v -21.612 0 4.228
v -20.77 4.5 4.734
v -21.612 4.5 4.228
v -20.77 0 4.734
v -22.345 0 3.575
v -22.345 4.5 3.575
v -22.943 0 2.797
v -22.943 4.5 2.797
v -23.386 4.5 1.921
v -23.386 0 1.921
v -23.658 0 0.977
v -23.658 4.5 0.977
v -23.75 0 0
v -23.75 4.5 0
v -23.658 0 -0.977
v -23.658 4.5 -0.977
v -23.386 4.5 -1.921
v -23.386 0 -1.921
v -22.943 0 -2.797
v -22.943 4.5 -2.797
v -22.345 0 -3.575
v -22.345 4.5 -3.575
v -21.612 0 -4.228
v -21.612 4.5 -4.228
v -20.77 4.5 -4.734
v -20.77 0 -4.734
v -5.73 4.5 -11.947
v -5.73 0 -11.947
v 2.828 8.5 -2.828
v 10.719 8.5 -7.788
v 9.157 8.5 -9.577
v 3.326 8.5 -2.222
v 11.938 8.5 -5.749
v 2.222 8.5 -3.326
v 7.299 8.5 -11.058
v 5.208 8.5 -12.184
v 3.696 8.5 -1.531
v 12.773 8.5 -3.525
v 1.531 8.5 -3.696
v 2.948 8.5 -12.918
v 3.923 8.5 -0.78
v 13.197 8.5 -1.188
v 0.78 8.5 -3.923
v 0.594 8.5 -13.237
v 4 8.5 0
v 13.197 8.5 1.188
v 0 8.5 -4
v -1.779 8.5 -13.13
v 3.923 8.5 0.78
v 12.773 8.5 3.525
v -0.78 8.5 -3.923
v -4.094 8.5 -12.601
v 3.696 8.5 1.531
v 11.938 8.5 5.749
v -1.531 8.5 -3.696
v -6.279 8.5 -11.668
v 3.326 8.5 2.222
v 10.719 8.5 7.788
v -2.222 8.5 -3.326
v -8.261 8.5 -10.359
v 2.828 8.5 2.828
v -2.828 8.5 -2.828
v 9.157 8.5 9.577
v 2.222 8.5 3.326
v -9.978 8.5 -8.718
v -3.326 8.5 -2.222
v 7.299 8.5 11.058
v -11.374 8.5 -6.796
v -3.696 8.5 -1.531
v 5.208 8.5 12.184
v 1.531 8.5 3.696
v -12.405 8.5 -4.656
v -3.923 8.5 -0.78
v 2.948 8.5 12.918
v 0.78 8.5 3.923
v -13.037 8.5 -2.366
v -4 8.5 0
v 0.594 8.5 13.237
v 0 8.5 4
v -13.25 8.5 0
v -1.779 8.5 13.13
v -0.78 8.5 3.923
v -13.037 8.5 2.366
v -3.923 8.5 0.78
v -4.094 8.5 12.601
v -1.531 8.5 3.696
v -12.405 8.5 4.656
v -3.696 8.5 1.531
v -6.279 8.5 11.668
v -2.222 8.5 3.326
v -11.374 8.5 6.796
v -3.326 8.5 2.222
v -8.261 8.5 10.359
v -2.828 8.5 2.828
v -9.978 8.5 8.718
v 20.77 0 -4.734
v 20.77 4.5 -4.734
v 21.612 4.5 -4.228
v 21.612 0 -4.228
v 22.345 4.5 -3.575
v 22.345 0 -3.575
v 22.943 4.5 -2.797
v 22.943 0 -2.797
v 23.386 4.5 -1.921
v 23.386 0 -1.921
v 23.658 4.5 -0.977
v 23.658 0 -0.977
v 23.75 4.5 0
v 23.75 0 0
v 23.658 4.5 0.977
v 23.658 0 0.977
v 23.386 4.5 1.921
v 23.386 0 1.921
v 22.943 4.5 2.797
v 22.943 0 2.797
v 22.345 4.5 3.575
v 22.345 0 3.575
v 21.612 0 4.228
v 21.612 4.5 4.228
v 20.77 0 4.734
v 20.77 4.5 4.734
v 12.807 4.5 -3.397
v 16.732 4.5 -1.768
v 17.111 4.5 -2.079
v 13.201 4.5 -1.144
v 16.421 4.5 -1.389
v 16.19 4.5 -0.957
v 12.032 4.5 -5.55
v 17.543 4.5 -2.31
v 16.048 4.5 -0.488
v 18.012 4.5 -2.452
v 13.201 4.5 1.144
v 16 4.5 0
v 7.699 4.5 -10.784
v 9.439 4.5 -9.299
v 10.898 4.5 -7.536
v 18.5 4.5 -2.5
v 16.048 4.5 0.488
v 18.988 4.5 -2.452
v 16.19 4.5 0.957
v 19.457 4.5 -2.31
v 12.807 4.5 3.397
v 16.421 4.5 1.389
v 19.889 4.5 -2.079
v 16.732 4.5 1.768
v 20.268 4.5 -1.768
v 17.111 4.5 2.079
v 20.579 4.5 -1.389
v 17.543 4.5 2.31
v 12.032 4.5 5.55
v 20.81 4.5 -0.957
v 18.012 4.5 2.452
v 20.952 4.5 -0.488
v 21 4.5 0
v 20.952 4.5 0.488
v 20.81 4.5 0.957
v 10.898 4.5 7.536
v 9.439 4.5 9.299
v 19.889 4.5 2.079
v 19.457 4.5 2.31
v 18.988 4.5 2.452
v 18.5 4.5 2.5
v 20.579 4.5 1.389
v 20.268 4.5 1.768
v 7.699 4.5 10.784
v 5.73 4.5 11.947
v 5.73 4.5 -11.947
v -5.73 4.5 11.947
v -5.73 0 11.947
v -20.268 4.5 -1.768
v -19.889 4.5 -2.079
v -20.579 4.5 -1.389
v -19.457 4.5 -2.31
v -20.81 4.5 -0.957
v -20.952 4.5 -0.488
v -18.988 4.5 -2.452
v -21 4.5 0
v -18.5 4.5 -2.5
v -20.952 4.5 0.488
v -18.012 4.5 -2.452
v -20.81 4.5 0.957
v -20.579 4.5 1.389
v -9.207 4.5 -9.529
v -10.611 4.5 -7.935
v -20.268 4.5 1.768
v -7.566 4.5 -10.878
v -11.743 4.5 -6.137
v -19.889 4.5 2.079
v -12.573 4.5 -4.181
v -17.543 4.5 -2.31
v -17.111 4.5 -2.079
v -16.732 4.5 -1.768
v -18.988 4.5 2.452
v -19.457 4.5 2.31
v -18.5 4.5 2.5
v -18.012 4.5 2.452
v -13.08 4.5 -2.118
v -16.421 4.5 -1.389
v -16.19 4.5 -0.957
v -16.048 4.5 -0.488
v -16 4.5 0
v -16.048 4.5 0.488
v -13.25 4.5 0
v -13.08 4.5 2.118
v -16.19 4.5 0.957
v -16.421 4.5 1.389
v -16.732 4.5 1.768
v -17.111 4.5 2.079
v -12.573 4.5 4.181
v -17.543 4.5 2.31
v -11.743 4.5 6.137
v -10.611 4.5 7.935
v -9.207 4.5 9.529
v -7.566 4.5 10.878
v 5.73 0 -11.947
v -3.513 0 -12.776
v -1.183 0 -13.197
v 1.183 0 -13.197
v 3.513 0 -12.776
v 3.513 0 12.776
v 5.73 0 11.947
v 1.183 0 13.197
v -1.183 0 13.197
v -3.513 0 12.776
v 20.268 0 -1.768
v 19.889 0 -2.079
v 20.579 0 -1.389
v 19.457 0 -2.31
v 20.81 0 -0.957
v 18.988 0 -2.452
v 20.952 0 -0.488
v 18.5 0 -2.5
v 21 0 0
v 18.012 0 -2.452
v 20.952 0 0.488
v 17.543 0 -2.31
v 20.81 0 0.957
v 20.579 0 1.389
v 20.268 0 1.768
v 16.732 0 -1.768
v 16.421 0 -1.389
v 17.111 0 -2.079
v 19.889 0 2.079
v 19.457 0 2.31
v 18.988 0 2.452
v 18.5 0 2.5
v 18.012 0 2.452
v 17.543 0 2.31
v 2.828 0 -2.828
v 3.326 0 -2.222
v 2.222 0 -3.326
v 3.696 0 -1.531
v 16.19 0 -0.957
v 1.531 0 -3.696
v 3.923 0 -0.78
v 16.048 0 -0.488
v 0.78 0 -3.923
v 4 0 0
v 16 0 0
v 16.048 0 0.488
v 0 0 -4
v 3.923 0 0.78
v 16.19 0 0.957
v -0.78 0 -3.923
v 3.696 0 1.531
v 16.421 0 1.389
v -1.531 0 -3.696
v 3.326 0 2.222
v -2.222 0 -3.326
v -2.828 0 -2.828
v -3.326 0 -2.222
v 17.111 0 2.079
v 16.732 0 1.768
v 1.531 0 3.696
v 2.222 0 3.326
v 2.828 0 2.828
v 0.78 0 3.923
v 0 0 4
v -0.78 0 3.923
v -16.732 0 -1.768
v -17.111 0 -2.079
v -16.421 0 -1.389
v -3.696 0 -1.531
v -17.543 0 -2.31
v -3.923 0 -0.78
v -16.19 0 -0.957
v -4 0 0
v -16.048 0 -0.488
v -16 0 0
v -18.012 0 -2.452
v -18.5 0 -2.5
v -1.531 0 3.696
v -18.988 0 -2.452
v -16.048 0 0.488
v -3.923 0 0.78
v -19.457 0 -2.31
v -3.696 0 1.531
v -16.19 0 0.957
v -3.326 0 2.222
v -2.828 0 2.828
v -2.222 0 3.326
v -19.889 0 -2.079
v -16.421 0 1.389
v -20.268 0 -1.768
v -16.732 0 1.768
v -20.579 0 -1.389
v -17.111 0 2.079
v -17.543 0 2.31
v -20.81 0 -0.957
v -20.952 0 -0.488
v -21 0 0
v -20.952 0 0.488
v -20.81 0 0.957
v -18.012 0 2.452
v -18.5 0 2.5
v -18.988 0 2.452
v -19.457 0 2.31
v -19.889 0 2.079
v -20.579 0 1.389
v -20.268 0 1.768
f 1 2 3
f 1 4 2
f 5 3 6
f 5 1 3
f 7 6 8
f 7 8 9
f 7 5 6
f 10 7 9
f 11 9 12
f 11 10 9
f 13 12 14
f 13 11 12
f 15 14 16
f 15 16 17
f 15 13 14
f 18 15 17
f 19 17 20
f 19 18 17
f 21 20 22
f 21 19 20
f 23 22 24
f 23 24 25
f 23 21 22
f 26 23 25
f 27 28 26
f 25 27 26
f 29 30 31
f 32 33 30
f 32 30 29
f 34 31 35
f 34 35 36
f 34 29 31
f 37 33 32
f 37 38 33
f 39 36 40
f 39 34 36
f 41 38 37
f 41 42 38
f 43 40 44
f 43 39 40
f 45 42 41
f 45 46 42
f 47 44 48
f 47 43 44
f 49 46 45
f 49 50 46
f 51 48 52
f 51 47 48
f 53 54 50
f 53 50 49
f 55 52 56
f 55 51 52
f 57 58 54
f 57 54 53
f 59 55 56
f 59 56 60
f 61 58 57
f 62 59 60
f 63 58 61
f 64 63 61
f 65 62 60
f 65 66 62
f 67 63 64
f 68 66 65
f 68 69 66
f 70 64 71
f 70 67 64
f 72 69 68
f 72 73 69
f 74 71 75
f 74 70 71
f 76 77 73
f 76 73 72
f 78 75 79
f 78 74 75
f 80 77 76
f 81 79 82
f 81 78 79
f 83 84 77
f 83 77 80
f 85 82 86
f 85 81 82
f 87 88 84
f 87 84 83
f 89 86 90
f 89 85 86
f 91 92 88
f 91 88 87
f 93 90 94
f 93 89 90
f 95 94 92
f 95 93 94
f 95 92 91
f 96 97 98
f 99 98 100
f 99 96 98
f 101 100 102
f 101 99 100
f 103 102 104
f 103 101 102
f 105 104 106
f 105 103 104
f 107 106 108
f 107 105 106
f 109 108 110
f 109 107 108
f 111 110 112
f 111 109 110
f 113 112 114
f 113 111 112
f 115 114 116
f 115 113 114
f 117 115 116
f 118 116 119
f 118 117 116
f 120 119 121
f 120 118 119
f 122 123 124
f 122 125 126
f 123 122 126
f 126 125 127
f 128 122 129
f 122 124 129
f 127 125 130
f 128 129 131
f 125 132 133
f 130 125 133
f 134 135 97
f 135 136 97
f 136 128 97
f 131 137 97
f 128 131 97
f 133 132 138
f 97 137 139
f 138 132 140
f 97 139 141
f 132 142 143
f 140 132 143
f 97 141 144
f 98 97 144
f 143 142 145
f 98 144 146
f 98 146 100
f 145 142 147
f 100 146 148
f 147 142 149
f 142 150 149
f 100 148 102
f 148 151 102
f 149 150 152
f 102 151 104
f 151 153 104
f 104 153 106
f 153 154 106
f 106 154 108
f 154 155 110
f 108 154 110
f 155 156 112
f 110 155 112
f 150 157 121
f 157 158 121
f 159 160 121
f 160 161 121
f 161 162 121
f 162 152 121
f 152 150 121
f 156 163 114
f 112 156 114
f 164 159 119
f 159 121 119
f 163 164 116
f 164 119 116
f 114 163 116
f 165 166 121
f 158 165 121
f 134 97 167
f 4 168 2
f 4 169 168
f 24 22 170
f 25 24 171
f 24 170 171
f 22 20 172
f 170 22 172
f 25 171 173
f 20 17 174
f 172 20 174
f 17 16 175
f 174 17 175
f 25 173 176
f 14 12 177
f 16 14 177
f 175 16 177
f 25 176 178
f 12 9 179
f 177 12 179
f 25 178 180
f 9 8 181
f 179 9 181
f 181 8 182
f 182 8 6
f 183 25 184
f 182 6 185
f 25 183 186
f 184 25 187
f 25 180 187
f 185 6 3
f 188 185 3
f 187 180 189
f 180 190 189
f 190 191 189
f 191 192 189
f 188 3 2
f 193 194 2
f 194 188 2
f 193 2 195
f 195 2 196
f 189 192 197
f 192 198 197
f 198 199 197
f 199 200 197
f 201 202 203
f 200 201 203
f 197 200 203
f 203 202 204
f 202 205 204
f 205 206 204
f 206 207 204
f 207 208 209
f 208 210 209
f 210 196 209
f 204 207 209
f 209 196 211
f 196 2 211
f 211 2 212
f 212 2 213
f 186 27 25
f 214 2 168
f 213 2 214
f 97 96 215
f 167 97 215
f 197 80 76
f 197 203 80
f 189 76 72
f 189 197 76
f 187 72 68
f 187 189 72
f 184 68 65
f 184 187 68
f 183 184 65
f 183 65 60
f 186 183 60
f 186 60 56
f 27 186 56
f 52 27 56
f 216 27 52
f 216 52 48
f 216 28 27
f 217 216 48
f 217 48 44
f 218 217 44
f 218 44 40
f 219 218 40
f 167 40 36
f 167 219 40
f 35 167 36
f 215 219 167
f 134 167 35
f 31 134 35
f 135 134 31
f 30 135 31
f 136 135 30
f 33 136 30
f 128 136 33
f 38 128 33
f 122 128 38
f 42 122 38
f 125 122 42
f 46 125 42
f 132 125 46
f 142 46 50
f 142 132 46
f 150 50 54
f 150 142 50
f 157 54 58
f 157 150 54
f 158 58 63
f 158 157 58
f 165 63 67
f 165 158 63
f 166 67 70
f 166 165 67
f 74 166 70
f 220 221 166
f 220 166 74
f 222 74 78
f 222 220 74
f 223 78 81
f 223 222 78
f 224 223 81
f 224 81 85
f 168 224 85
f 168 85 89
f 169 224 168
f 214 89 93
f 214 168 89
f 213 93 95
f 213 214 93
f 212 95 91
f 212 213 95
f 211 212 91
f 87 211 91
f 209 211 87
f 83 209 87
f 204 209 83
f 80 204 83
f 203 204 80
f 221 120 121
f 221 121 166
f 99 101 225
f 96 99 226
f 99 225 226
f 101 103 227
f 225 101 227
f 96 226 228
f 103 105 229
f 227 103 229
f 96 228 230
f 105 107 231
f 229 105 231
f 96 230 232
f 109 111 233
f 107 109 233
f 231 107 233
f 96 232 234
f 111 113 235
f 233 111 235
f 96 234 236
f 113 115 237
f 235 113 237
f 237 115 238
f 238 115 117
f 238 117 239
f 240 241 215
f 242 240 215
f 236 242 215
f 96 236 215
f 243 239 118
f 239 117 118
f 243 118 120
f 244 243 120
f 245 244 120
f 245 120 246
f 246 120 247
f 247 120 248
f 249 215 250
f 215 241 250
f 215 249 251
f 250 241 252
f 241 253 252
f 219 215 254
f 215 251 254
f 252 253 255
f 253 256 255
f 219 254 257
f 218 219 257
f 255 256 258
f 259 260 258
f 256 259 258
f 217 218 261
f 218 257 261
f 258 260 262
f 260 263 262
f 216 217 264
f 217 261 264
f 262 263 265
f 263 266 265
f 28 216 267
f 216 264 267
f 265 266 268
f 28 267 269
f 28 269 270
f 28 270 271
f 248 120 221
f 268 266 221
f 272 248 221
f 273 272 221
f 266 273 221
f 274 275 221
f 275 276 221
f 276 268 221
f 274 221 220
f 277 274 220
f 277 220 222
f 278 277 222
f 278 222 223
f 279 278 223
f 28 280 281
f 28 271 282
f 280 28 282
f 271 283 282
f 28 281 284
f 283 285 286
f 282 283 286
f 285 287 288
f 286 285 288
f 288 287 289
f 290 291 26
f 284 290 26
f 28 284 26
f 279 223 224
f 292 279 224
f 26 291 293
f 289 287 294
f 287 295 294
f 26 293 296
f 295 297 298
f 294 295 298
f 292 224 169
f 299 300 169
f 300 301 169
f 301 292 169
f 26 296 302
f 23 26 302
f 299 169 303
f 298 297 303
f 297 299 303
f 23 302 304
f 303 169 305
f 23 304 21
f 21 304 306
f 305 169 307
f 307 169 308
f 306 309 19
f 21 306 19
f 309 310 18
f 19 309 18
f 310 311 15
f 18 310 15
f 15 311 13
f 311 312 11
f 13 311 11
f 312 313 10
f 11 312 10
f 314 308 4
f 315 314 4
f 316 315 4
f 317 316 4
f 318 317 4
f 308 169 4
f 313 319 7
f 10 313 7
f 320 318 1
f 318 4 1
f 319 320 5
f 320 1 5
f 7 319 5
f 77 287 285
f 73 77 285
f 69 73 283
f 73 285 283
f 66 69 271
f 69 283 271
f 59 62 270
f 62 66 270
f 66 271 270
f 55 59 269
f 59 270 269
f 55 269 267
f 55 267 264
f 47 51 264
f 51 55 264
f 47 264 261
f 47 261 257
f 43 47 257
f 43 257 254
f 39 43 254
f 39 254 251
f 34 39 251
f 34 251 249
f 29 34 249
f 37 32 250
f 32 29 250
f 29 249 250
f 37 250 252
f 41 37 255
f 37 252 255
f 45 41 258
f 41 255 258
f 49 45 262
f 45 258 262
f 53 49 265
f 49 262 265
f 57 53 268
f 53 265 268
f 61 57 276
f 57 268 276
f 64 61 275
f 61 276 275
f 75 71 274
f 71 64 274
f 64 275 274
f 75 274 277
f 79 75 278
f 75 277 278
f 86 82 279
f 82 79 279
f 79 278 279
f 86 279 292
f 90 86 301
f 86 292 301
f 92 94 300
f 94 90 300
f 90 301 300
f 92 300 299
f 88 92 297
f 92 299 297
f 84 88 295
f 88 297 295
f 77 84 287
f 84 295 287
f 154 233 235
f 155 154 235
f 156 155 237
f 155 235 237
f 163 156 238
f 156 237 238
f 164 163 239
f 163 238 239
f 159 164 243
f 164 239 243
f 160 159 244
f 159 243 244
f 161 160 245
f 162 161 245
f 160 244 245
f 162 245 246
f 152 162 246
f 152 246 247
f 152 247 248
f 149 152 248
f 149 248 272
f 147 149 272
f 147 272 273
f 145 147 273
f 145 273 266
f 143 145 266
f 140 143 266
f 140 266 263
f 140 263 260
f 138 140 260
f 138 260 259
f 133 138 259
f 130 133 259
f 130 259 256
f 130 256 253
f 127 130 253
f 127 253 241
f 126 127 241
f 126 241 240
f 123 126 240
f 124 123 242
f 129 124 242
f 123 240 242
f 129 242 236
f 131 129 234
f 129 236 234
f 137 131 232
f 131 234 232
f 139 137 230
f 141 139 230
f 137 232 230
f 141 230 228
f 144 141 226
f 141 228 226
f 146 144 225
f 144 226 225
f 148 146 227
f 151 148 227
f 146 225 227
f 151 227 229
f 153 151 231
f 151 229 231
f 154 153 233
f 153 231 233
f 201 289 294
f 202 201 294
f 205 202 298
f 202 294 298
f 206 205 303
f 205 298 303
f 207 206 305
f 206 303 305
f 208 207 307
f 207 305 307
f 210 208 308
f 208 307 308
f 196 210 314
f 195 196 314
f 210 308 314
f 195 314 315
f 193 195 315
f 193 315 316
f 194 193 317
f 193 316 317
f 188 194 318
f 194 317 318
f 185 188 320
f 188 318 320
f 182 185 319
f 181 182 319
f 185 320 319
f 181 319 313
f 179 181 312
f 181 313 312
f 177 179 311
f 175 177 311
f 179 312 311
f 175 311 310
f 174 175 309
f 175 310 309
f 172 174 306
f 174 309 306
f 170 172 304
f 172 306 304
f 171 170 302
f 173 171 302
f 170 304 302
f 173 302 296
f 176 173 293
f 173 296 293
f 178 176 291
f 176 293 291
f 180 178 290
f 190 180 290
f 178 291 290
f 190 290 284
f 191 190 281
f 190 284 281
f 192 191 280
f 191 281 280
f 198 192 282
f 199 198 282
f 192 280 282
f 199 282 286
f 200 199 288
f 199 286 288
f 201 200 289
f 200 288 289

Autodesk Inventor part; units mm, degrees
ref_plane "YZ Plane" through (0, 0, 0) normal (1, 0, 0) x (0, 1, 0)
ref_plane "XZ Plane" through (0, 0, 0) normal (0, 1, 0) x (-1, 0, 0)
ref_plane "XY Plane" through (0, 0, 0) normal (0, 0, 1) x (1, 0, 0)
sketch "Sketch1" plane through (0, 0, 0) normal (0, 1, 0) x (-1, 0, 0)
  circle A0 centre (0, 0) radius 13.25
  circle A1 centre (0, 0) radius 4
  dimension "d0" = 26.5
  dimension "d1" = 8
extrude "Extrusion1" add sketch "Sketch1" along normal blind 8.5
sketch "Sketch2" plane through (0, 0, 0) normal (0, -1, 0) x (1, 0, 0)
  circle A0 centre (18.5, 0) radius 2.5
  circle A1 centre (-18.5, 0) radius 2.5
  circle A2 centre (18.5, 0) radius 5.25
  circle A3 centre (-18.5, 0) radius 5.25
  line L0 (20.7703, -4.7337) -> (5.7297, -11.9471)
  circle A4 centre (0, 0) radius 13.25 projected
  line L1 (20.7703, 4.7337) -> (5.7297, 11.9471)
  line L2 (-5.7297, -11.9471) -> (-20.7703, -4.7337)
  line L3 (-5.7297, 11.9471) -> (-20.7703, 4.7337)
  point P0 (0, 18.5)
  point P1 (0, -18.5)
  dimension "d6" = 5
  dimension "d7" = 5
  dimension "d8" = 37
  dimension "d9" = 18.5
  dimension "d10" = 10.5
  dimension "d11" = 10.5
  dimension "d14" = 47.5
extrude "Extrusion2" add sketch "Sketch2" against normal blind 4.5 contours A2 | A2 A4 L1 | L0 A4 A2 | A4 A3 L3 | L2 A3 A4 | A3
properties part number "O_Do_Lan" material "Aluminum 6061-AHC"
